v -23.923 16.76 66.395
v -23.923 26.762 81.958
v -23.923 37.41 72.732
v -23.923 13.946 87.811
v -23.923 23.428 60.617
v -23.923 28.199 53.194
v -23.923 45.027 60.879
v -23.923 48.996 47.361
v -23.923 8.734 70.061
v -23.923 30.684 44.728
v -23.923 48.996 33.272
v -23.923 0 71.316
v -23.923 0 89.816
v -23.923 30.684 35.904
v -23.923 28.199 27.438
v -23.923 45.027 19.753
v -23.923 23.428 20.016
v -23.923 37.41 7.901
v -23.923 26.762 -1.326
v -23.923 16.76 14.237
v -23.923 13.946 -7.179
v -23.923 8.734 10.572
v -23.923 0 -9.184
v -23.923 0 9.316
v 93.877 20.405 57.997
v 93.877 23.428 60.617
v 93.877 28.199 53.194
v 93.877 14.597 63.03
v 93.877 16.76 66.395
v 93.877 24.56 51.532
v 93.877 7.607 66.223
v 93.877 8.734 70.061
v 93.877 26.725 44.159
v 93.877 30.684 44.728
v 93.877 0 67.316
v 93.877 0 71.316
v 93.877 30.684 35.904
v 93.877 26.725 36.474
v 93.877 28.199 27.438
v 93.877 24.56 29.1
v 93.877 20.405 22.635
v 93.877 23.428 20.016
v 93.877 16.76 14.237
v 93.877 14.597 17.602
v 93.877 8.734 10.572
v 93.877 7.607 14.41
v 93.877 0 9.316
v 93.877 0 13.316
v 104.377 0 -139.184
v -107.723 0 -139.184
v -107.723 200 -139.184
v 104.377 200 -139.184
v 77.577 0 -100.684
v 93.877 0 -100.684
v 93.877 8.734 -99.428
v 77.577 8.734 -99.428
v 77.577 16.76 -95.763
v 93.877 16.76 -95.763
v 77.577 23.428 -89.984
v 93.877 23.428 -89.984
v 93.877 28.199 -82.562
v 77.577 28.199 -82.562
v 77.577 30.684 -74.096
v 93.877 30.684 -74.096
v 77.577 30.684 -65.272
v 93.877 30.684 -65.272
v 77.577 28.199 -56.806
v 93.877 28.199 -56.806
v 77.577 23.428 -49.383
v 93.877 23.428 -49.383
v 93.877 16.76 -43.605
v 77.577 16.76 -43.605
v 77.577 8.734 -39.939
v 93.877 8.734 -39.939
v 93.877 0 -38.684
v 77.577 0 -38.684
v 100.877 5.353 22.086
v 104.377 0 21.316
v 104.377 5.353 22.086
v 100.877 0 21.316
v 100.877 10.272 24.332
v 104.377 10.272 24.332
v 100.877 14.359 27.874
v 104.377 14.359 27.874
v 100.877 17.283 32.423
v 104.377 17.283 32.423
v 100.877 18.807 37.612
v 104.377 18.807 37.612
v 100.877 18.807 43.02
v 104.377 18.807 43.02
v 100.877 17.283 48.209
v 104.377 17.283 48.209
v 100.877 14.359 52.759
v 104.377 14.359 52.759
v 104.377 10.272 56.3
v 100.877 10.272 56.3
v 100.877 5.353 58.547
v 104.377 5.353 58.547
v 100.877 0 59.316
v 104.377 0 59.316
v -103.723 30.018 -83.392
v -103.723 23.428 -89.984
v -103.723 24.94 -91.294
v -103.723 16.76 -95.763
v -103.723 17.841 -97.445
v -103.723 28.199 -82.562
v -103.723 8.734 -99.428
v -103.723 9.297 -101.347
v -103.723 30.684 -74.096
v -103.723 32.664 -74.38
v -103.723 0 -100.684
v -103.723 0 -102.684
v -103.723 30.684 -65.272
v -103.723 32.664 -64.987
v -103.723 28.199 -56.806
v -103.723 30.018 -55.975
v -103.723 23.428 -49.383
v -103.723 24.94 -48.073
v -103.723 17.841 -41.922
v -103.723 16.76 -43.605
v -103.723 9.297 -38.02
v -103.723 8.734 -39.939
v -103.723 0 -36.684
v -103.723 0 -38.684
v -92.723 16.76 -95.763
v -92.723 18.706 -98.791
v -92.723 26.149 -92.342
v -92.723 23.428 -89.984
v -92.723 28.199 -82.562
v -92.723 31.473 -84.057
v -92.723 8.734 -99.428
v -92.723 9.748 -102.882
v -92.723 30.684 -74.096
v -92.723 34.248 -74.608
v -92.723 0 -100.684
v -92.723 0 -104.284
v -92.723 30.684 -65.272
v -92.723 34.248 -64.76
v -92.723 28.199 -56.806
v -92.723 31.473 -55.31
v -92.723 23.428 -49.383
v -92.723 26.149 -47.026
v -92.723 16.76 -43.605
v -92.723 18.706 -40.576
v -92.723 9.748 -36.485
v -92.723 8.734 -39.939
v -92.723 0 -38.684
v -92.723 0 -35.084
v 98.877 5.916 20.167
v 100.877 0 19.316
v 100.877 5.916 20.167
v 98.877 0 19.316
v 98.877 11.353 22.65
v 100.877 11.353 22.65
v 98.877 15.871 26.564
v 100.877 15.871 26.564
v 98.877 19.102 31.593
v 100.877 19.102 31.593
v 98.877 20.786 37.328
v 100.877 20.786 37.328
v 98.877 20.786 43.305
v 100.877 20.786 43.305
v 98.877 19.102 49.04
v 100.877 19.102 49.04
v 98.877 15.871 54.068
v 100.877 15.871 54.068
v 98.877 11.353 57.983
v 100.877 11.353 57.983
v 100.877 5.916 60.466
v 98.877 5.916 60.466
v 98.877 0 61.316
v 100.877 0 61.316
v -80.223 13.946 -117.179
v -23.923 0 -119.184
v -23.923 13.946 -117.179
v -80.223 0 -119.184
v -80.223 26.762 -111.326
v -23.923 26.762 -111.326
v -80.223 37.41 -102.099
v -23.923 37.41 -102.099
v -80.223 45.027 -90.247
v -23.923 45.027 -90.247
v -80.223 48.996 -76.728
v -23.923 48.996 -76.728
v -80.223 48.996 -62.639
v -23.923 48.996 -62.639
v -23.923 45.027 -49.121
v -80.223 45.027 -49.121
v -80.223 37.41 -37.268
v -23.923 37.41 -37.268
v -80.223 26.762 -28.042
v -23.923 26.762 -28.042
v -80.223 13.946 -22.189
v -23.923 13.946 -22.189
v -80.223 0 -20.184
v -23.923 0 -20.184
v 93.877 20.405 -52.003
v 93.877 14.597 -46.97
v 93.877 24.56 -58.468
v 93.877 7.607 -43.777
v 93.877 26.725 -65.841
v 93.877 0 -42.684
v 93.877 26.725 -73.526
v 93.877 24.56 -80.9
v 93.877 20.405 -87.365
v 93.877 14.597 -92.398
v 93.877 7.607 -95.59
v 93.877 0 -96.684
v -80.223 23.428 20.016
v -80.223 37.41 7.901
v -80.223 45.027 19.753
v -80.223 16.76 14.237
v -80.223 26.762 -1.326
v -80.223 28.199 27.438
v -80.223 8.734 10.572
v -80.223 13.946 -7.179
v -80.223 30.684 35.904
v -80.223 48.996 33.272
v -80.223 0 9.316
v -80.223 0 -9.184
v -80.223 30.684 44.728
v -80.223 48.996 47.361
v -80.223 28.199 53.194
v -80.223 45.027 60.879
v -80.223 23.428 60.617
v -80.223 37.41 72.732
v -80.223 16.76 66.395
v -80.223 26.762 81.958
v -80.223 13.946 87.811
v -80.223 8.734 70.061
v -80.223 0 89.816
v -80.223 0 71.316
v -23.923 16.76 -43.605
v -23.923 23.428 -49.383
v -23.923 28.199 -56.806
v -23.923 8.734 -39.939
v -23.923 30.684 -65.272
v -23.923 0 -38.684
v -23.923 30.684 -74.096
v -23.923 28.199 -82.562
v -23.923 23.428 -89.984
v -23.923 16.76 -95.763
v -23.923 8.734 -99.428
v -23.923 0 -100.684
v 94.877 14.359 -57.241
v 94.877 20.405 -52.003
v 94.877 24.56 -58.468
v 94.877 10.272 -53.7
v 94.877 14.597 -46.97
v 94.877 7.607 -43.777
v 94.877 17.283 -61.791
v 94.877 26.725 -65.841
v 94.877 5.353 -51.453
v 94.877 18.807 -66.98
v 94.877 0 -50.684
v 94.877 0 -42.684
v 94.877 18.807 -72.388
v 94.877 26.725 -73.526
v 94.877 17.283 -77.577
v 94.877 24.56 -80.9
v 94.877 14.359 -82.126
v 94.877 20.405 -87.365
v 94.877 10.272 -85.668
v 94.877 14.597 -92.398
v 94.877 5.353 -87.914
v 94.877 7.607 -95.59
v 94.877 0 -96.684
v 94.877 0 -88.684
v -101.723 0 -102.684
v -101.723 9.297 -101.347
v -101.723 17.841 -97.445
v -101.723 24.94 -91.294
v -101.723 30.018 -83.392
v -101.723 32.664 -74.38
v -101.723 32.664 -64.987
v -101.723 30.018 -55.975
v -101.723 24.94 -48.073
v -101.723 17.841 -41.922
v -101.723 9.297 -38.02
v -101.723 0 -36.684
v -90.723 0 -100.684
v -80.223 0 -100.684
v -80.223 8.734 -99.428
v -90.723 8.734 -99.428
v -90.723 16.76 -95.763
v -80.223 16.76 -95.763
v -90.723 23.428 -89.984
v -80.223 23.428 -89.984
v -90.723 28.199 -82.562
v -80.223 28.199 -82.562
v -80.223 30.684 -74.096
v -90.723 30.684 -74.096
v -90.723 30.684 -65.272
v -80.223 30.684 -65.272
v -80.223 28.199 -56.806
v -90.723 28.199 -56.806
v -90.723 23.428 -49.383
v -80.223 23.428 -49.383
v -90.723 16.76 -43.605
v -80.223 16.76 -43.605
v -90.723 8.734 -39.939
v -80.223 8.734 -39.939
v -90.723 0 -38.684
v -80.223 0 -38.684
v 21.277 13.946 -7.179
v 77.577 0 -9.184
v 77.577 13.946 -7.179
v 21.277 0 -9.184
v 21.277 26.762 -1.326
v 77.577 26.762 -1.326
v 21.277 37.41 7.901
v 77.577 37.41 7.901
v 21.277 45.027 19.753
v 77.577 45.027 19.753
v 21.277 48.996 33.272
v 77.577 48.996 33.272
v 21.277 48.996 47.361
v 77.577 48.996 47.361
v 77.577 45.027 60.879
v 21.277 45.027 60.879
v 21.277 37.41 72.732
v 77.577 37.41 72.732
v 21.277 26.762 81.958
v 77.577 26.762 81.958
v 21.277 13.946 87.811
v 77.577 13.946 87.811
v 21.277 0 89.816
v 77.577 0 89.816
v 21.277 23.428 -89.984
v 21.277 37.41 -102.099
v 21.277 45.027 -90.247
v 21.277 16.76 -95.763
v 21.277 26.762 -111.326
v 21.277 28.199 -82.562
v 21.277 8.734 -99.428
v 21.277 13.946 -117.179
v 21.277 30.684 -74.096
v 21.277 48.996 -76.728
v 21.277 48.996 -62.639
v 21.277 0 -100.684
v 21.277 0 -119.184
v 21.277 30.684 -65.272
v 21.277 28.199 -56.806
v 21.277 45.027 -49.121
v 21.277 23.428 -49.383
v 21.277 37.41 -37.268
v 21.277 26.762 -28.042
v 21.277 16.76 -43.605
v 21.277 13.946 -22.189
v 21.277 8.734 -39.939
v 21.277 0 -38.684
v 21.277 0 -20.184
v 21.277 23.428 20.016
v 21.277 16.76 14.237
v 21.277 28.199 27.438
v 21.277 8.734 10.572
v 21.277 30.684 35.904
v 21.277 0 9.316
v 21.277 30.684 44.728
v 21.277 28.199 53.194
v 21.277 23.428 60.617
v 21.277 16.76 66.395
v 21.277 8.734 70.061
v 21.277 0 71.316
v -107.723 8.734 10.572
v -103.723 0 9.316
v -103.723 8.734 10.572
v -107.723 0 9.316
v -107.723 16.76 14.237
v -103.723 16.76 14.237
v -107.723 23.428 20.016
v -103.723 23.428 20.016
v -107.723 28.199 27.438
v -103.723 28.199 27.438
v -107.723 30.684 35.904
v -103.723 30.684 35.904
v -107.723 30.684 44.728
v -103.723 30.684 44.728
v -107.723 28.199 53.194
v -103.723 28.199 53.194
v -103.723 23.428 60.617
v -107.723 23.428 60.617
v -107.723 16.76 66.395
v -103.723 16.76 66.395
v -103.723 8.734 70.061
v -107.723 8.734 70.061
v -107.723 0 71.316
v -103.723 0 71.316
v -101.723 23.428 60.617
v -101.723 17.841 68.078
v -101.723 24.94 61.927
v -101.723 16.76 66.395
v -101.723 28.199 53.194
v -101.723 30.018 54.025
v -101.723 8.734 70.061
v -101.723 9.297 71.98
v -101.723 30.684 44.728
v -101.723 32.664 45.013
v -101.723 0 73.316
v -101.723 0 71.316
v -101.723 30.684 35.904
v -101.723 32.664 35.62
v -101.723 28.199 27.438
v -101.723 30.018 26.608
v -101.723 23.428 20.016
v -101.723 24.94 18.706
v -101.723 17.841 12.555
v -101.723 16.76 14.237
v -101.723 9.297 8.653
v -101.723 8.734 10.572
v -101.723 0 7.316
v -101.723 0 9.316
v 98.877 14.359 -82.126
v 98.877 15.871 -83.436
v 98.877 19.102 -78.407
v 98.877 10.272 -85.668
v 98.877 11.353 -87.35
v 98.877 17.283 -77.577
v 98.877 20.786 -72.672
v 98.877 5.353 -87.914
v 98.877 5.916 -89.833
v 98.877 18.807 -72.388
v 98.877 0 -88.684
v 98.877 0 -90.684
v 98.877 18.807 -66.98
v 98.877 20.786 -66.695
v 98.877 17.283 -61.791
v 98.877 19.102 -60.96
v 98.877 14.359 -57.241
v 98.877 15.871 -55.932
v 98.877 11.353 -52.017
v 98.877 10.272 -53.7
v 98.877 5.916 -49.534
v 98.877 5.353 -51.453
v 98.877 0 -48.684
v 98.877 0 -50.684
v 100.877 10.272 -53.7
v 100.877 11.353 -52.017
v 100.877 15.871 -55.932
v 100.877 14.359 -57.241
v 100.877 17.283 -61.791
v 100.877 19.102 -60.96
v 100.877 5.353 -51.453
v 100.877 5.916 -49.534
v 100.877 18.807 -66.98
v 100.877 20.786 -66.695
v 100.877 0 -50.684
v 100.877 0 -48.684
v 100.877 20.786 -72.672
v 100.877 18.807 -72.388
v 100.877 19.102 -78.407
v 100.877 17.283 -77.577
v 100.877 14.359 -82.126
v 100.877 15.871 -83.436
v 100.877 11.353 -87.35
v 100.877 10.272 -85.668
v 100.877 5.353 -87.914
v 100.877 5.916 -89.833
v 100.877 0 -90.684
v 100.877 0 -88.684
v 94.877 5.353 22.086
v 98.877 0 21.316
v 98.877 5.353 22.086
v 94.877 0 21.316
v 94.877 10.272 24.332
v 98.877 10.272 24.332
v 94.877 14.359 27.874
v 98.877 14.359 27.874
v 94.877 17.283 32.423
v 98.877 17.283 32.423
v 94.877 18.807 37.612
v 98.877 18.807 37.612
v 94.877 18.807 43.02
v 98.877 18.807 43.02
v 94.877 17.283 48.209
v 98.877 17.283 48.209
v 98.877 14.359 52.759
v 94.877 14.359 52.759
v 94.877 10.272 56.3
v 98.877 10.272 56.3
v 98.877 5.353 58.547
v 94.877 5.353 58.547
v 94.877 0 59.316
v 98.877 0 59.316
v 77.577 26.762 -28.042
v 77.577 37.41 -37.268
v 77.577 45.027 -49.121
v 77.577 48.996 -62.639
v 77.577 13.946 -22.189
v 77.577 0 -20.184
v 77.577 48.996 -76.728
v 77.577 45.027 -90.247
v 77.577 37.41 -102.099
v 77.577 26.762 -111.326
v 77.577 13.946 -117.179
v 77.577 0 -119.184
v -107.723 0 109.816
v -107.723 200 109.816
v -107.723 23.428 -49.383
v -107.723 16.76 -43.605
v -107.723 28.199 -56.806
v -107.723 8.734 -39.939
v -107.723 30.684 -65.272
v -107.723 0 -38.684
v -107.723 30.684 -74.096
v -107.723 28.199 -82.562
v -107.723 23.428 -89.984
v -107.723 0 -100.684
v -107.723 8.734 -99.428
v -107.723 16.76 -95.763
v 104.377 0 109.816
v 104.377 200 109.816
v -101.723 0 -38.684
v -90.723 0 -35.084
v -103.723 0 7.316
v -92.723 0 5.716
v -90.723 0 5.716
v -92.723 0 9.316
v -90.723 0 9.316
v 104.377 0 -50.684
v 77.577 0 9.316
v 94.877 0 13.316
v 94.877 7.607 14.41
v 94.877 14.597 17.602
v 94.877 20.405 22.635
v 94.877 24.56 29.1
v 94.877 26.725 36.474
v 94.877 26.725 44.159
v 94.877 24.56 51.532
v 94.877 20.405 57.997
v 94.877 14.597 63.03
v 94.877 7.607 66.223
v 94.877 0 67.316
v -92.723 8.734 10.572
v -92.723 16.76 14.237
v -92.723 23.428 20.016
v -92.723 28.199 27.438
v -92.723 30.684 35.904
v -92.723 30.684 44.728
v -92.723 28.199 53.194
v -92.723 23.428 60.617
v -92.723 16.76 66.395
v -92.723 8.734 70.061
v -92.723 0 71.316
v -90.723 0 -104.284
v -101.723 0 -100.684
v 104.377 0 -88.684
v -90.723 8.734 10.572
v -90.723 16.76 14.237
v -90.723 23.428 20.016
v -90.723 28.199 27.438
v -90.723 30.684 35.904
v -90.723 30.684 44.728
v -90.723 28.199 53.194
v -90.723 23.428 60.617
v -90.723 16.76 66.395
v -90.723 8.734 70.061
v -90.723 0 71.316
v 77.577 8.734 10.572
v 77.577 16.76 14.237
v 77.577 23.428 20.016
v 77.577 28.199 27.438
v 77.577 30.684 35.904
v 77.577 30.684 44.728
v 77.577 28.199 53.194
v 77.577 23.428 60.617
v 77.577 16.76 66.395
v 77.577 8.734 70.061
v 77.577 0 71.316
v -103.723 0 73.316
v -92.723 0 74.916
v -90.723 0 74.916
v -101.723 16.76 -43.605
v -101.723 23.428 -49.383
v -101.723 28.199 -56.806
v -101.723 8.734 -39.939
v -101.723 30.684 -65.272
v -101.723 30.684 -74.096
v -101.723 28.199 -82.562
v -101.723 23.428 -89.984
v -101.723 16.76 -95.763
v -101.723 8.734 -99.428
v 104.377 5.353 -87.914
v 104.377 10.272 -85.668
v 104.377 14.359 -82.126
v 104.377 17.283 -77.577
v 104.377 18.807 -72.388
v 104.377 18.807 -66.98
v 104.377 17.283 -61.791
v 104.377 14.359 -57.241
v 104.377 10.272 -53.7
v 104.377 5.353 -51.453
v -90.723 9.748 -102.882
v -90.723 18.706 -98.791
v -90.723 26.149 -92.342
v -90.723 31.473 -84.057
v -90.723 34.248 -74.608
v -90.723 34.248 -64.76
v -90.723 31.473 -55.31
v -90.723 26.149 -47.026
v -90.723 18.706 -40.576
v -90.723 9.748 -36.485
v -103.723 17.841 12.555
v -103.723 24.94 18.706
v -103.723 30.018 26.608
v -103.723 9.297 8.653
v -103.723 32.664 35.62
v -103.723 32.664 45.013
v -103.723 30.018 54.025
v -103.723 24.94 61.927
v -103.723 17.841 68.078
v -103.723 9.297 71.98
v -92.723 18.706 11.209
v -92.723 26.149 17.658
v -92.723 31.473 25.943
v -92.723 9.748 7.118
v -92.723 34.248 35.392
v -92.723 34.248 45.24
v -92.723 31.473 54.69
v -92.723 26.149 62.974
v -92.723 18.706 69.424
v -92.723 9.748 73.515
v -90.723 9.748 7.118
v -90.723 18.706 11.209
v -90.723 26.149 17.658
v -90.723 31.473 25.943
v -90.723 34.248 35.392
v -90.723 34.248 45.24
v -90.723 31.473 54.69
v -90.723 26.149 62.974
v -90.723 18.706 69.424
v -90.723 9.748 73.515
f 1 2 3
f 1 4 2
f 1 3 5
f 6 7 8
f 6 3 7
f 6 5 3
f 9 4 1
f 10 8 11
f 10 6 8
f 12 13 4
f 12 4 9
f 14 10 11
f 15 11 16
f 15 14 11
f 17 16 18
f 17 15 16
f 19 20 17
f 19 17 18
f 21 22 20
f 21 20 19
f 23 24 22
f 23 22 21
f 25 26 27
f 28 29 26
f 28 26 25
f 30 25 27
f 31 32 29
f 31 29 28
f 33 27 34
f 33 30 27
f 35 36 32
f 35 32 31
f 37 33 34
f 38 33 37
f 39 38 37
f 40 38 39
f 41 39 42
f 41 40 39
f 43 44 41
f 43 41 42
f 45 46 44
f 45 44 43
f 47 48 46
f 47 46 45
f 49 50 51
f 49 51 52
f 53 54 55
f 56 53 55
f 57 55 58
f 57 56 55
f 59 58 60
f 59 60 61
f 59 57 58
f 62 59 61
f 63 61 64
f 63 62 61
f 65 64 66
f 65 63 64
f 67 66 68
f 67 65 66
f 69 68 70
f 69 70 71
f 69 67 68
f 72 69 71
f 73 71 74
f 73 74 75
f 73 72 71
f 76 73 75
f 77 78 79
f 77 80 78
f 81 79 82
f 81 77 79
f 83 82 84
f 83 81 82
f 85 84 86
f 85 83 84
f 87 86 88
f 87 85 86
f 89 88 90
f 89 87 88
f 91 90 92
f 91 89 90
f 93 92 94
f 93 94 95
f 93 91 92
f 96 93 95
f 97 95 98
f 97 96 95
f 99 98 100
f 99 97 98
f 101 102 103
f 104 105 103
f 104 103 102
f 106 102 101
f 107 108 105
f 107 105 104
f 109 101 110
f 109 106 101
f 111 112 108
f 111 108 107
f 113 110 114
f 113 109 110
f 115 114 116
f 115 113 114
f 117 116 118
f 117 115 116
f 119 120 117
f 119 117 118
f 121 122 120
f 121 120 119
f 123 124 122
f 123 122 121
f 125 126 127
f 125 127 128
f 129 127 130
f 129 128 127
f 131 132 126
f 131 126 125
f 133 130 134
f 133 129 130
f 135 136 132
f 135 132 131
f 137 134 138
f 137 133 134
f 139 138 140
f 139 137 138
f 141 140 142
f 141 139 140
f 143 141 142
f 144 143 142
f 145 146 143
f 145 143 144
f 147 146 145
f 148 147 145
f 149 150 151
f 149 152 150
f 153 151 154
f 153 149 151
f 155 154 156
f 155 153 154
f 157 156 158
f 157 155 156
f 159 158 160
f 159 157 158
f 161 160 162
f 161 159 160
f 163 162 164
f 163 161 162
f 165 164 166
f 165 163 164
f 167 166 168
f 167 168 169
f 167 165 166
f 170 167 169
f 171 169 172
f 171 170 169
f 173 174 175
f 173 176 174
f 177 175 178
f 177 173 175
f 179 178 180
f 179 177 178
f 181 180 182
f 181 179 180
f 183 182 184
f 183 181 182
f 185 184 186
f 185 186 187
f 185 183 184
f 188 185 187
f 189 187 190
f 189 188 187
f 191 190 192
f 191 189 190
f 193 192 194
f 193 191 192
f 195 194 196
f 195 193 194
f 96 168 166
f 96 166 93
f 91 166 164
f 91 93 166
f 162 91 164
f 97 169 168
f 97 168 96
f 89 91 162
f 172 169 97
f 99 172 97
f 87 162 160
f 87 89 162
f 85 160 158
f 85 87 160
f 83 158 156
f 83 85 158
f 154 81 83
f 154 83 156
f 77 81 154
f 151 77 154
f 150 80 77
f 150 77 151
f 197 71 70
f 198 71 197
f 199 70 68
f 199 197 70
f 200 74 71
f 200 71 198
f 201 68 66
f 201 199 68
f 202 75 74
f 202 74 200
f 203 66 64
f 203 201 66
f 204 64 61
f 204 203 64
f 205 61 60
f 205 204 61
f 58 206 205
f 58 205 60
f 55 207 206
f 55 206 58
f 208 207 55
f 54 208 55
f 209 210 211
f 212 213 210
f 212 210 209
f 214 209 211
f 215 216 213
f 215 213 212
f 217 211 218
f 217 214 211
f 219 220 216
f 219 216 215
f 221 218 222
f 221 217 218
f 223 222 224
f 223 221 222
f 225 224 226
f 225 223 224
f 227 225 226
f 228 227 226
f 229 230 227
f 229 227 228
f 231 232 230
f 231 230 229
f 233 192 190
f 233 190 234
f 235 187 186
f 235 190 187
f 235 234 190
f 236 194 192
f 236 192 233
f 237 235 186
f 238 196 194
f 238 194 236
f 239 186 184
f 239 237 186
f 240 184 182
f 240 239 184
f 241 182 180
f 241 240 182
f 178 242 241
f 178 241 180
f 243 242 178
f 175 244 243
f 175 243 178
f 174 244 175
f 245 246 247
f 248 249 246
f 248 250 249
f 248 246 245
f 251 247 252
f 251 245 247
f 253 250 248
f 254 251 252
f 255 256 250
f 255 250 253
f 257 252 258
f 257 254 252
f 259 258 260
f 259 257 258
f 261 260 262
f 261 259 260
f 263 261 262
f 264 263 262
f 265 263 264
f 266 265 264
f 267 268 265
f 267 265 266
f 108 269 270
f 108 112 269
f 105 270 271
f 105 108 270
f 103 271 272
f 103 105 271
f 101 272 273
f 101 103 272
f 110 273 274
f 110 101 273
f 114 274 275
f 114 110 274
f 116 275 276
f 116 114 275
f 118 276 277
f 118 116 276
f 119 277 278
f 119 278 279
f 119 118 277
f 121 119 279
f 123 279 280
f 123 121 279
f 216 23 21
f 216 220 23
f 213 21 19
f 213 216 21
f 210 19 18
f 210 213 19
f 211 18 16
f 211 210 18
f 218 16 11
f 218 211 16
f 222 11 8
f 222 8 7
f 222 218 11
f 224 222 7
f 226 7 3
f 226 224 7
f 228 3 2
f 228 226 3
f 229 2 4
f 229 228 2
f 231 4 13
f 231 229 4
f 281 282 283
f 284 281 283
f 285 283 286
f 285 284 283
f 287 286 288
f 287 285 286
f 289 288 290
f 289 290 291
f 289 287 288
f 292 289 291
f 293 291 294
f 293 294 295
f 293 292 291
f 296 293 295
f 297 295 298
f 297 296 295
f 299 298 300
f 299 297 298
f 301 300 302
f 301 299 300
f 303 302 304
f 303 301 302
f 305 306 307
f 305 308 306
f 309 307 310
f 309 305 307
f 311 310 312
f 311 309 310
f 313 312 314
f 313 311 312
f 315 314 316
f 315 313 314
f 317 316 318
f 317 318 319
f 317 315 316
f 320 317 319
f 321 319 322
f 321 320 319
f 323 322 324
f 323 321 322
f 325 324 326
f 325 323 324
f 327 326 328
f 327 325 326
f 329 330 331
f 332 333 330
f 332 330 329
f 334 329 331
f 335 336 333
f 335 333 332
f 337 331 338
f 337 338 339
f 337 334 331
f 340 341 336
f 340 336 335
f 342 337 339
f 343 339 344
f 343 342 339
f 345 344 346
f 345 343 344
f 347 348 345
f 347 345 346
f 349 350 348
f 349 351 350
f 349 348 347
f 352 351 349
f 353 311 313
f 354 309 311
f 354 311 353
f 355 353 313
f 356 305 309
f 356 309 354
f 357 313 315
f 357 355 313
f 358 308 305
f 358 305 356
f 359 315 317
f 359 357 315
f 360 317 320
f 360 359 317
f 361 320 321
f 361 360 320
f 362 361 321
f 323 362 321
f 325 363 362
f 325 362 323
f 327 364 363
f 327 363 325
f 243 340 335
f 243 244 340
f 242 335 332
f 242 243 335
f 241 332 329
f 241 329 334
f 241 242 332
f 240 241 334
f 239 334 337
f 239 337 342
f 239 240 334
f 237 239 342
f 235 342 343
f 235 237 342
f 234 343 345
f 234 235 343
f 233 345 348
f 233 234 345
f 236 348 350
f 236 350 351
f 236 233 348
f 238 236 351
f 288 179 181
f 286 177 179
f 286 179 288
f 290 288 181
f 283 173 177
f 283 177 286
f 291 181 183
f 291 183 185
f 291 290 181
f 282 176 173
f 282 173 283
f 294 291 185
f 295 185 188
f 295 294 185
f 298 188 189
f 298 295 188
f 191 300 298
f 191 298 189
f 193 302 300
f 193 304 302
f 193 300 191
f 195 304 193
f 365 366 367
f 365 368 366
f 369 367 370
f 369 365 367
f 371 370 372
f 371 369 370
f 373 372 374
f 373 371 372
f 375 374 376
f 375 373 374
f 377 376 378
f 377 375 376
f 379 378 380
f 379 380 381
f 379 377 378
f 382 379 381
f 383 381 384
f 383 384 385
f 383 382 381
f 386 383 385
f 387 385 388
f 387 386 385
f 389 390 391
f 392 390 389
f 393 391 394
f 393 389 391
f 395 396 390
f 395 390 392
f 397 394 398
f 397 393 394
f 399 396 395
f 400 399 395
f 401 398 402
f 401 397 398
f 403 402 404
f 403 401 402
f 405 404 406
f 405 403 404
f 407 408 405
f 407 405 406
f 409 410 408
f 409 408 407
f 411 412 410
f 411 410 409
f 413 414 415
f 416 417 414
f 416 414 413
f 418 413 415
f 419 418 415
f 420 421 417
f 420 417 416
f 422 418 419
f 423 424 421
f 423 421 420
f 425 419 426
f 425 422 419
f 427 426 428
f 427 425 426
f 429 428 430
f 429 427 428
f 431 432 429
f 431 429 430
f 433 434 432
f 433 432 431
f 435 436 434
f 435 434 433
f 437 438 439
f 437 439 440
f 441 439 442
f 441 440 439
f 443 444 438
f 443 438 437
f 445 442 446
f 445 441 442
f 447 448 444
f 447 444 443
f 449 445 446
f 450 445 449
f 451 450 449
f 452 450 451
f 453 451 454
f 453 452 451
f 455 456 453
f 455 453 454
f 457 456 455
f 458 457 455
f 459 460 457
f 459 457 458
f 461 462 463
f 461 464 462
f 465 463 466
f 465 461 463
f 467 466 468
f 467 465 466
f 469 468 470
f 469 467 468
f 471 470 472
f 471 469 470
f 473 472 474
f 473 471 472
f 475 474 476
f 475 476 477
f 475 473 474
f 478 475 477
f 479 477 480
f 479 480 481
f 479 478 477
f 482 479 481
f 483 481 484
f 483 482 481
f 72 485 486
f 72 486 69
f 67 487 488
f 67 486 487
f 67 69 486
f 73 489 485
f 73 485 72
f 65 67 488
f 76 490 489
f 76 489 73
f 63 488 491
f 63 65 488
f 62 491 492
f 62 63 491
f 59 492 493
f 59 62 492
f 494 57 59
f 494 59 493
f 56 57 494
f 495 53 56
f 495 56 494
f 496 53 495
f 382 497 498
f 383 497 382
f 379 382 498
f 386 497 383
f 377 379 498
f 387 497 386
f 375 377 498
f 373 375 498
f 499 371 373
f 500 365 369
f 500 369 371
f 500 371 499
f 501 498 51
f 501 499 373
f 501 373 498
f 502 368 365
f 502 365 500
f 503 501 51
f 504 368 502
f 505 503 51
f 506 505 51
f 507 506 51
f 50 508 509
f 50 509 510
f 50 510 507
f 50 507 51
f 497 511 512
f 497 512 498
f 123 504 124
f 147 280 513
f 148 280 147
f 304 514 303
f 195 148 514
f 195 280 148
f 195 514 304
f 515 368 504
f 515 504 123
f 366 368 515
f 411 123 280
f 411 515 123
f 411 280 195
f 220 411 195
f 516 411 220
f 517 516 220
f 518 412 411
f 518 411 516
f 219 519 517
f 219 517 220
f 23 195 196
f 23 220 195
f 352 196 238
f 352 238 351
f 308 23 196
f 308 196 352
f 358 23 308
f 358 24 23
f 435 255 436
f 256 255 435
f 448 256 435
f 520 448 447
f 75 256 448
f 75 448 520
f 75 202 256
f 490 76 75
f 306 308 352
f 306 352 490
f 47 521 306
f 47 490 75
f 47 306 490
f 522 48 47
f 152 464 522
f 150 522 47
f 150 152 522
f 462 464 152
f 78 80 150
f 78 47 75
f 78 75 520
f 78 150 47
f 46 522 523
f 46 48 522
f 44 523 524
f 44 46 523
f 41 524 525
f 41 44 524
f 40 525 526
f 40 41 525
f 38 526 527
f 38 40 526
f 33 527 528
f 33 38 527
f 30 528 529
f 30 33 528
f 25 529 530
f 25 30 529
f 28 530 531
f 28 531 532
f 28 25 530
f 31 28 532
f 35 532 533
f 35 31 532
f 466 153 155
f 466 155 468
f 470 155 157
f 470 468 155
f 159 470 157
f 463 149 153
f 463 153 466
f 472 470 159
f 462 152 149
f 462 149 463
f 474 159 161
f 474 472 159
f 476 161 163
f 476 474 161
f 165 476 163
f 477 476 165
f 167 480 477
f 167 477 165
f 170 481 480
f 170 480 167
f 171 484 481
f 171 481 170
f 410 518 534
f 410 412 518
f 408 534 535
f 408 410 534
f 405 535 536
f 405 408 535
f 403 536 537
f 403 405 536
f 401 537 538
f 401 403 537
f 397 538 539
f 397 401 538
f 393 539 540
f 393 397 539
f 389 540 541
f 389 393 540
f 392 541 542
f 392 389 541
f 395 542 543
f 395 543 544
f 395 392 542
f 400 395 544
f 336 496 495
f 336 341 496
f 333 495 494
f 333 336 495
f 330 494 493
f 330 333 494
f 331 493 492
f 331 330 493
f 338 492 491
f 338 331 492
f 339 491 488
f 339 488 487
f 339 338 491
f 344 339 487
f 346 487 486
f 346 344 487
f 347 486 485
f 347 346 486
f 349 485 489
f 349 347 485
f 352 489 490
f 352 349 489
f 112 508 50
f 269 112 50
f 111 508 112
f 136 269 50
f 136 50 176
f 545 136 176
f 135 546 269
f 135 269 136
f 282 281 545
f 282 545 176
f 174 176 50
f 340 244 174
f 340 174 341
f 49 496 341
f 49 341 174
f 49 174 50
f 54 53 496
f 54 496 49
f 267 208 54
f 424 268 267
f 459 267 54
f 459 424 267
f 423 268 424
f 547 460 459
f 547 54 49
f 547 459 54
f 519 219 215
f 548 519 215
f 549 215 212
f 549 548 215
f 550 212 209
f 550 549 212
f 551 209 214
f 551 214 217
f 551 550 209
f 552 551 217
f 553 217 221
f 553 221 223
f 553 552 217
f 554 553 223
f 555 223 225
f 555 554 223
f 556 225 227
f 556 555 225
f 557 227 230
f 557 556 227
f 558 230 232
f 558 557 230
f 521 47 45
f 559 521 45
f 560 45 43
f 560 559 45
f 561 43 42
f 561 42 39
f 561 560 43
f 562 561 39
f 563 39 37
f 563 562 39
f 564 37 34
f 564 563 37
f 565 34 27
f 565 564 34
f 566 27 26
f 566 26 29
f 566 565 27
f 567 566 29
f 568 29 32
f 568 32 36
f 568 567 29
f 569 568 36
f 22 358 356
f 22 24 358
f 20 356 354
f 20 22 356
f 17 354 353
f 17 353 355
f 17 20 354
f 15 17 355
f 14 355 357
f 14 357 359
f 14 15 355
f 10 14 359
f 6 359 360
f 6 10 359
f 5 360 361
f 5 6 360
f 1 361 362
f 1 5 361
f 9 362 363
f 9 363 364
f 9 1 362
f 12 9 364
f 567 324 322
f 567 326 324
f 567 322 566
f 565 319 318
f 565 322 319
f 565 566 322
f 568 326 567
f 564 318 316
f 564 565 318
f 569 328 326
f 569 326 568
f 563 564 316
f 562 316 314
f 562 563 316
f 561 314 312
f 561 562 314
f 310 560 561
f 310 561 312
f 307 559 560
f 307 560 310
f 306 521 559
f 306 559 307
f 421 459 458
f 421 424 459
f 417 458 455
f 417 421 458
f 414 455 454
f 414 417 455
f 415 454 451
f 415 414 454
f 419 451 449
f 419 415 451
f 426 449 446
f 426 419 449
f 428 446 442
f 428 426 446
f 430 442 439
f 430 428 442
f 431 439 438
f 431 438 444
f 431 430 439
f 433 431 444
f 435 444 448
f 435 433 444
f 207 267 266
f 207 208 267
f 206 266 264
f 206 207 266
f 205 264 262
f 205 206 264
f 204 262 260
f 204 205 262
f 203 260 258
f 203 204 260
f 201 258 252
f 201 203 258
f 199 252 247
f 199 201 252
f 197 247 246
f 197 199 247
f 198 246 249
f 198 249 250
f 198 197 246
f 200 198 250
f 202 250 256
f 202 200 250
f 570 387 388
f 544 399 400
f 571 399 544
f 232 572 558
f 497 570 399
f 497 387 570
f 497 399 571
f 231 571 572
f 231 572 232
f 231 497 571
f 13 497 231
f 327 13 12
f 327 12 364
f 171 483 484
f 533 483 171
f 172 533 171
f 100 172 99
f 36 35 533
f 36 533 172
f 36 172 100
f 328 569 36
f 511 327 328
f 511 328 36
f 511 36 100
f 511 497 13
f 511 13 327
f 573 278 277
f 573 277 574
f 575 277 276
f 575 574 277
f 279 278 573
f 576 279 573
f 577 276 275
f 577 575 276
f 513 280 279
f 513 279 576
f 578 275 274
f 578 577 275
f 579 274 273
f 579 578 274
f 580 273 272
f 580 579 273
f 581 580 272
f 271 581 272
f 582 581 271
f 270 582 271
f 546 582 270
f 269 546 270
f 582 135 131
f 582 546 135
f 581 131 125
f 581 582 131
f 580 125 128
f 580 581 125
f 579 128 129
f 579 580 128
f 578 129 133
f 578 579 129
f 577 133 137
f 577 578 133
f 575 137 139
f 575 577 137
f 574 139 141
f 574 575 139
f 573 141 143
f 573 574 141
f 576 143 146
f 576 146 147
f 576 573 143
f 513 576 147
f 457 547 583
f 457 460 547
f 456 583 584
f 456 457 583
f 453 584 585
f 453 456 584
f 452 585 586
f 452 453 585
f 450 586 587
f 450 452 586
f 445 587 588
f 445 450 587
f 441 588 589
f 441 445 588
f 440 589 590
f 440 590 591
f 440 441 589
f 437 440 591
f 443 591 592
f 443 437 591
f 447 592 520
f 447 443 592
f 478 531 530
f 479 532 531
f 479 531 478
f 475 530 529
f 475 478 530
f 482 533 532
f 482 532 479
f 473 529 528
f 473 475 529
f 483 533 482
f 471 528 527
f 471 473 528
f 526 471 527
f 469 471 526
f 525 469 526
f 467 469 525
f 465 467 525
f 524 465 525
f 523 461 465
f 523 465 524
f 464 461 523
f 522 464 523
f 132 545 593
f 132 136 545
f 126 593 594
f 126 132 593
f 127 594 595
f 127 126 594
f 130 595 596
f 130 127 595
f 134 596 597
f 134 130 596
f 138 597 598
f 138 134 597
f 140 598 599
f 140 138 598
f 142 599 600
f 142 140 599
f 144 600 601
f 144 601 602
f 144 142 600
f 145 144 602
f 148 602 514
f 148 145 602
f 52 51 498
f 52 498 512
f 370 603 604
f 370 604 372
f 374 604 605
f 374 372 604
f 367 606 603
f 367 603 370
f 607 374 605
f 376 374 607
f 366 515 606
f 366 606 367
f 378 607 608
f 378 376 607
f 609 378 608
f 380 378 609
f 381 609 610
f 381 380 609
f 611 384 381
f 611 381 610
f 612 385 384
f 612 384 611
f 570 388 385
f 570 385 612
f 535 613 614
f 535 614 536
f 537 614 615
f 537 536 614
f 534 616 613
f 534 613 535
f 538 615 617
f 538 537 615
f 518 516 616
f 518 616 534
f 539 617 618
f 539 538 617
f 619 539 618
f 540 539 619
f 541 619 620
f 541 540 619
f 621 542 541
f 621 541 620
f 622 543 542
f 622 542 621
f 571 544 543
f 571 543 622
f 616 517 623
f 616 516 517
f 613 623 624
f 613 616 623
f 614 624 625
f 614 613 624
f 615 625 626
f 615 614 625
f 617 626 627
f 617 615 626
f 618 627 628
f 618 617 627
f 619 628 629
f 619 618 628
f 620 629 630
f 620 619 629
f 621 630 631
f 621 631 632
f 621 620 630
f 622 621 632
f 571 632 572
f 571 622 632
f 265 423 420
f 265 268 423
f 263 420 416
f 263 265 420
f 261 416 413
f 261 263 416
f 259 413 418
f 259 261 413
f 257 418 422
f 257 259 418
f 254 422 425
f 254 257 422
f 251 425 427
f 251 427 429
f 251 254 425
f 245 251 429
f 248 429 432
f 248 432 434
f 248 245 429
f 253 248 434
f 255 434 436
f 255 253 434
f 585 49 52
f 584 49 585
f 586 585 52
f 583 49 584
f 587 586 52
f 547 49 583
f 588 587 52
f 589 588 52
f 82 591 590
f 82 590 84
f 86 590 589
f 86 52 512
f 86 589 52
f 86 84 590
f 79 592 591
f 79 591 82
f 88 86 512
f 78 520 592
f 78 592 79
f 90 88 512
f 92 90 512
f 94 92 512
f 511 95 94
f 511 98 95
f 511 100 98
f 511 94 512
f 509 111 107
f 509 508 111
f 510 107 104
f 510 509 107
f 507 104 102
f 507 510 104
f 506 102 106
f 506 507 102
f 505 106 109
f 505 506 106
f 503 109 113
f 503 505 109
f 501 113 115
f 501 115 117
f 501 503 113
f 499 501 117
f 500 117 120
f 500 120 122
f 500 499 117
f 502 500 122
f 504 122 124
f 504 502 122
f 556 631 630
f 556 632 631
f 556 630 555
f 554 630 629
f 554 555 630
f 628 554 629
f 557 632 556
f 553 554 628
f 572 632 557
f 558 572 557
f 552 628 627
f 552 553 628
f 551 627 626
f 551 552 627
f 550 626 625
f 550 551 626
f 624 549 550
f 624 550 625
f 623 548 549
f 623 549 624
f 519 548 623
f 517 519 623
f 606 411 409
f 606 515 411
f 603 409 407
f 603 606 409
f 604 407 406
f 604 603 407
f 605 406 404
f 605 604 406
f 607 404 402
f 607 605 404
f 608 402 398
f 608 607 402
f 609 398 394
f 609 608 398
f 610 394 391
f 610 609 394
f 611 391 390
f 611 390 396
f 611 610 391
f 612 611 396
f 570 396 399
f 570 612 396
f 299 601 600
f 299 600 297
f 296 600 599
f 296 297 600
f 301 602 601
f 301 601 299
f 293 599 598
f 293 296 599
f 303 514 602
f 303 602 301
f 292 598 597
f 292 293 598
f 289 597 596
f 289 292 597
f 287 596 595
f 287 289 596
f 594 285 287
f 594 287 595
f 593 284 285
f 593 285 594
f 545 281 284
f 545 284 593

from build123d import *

# Parameters (mm, degrees)
F1_DEPTH = 200


with BuildPart() as f1:
    # F0 (on Front) → F1 (new body)
    with BuildSketch(Plane.XZ):
        Polygon((-107.723215, 71.316256), (-107.723215, 40.316256), (104.376785, 40.316256), (104.376785, 59.316256), (100.876785, 59.316256), (100.876785, 61.316256), (98.876785, 61.316256), (98.876785, 59.316256), (94.876785, 59.316256), (94.876785, 67.316256), (93.876785, 67.316256), (93.876785, 71.316256), (77.576785, 71.316256), (77.576785, 89.816256), (21.276785, 89.816256), (21.276785, 71.316256), (-23.923215, 71.316256), (-23.923215, 89.816256), (-80.223215, 89.816256), (-80.223215, 71.316256), (-90.723215, 71.316256), (-90.723215, 74.916256), (-92.723215, 74.916256), (-92.723215, 71.316256), (-101.723215, 71.316256), (-101.723215, 73.316256), (-103.723215, 73.316256), (-103.723215, 71.316256), align=None)
        Polygon((-107.723215, 109.816256), (-107.723215, 71.316256), (-103.723215, 71.316256), (-103.723215, 73.316256), (-101.723215, 73.316256), (-101.723215, 71.316256), (-92.723215, 71.316256), (-92.723215, 74.916256), (-90.723215, 74.916256), (-90.723215, 71.316256), (-80.223215, 71.316256), (-80.223215, 89.816256), (-23.923215, 89.816256), (-23.923215, 71.316256), (21.276785, 71.316256), (21.276785, 89.816256), (77.576785, 89.816256), (77.576785, 71.316256), (93.876785, 71.316256), (93.876785, 67.316256), (94.876785, 67.316256), (94.876785, 59.316256), (98.876785, 59.316256), (98.876785, 61.316256), (100.876785, 61.316256), (100.876785, 59.316256), (104.376785, 59.316256), (104.376785, 109.816256), align=None)
        Polygon((-107.723215, 40.316256), (-107.723215, 9.316256), (-103.723215, 9.316256), (-103.723215, 7.316256), (-101.723215, 7.316256), (-101.723215, 9.316256), (-92.723215, 9.316256), (-92.723215, 5.716256), (-90.723215, 5.716256), (-90.723215, 9.316256), (-80.223215, 9.316256), (-80.223215, -9.183744), (-23.923215, -9.183744), (-23.923215, 9.316256), (21.276785, 9.316256), (21.276785, -9.183744), (77.576785, -9.183744), (77.576785, 9.316256), (93.876785, 9.316256), (93.876785, 13.316256), (94.876785, 13.316256), (94.876785, 21.316256), (98.876785, 21.316256), (98.876785, 19.316256), (100.876785, 19.316256), (100.876785, 21.316256), (104.376785, 21.316256), (104.376785, 40.316256), align=None)
        Polygon((-107.723215, 9.316256), (-107.723215, -38.683744), (-103.723215, -38.683744), (-103.723215, -36.683744), (-101.723215, -36.683744), (-101.723215, -38.683744), (-92.723215, -38.683744), (-92.723215, -35.083744), (-90.723215, -35.083744), (-90.723215, -38.683744), (-80.223215, -38.683744), (-80.223215, -20.183744), (-23.923215, -20.183744), (-23.923215, -38.683744), (21.276785, -38.683744), (21.276785, -20.183744), (77.576785, -20.183744), (77.576785, -38.683744), (93.876785, -38.683744), (93.876785, -42.683744), (94.876785, -42.683744), (94.876785, -50.683744), (98.876785, -50.683744), (98.876785, -48.683744), (100.876785, -48.683744), (100.876785, -50.683744), (104.376785, -50.683744), (104.376785, 21.316256), (100.876785, 21.316256), (100.876785, 19.316256), (98.876785, 19.316256), (98.876785, 21.316256), (94.876785, 21.316256), (94.876785, 13.316256), (93.876785, 13.316256), (93.876785, 9.316256), (77.576785, 9.316256), (77.576785, -9.183744), (21.276785, -9.183744), (21.276785, 9.316256), (-23.923215, 9.316256), (-23.923215, -9.183744), (-80.223215, -9.183744), (-80.223215, 9.316256), (-90.723215, 9.316256), (-90.723215, 5.716256), (-92.723215, 5.716256), (-92.723215, 9.316256), (-101.723215, 9.316256), (-101.723215, 7.316256), (-103.723215, 7.316256), (-103.723215, 9.316256), align=None)
        Polygon((-103.723215, -38.683744), (-107.723215, -38.683744), (-107.723215, -69.683744), (104.376785, -69.683744), (104.376785, -50.683744), (100.876785, -50.683744), (100.876785, -48.683744), (98.876785, -48.683744), (98.876785, -50.683744), (94.876785, -50.683744), (94.876785, -42.683744), (93.876785, -42.683744), (93.876785, -38.683744), (77.576785, -38.683744), (77.576785, -20.183744), (21.276785, -20.183744), (21.276785, -38.683744), (-23.923215, -38.683744), (-23.923215, -20.183744), (-80.223215, -20.183744), (-80.223215, -38.683744), (-90.723215, -38.683744), (-90.723215, -35.083744), (-92.723215, -35.083744), (-92.723215, -38.683744), (-101.723215, -38.683744), (-101.723215, -36.683744), (-103.723215, -36.683744), align=None)
        Polygon((104.376785, -69.683744), (-107.723215, -69.683744), (-107.723215, -100.683744), (-103.723215, -100.683744), (-103.723215, -102.683744), (-101.723215, -102.683744), (-101.723215, -100.683744), (-92.723215, -100.683744), (-92.723215, -104.283744), (-90.723215, -104.283744), (-90.723215, -100.683744), (-80.223215, -100.683744), (-80.223215, -119.183744), (-23.923215, -119.183744), (-23.923215, -100.683744), (21.276785, -100.683744), (21.276785, -119.183744), (77.576785, -119.183744), (77.576785, -100.683744), (93.876785, -100.683744), (93.876785, -96.683744), (94.876785, -96.683744), (94.876785, -88.683744), (98.876785, -88.683744), (98.876785, -90.683744), (100.876785, -90.683744), (100.876785, -88.683744), (104.376785, -88.683744), align=None)
        Polygon((-103.723215, -100.683744), (-107.723215, -100.683744), (-107.723215, -139.183744), (104.376785, -139.183744), (104.376785, -88.683744), (100.876785, -88.683744), (100.876785, -90.683744), (98.876785, -90.683744), (98.876785, -88.683744), (94.876785, -88.683744), (94.876785, -96.683744), (93.876785, -96.683744), (93.876785, -100.683744), (77.576785, -100.683744), (77.576785, -119.183744), (21.276785, -119.183744), (21.276785, -100.683744), (-23.923215, -100.683744), (-23.923215, -119.183744), (-80.223215, -119.183744), (-80.223215, -100.683744), (-90.723215, -100.683744), (-90.723215, -104.283744), (-92.723215, -104.283744), (-92.723215, -100.683744), (-101.723215, -100.683744), (-101.723215, -102.683744), (-103.723215, -102.683744), align=None)
    extrude(amount=-F1_DEPTH)

    # F0 (on Front) → F2 (revolve, cut)
    with BuildSketch(Plane.XZ):
        Polygon((-107.723215, 71.316256), (-107.723215, 40.316256), (104.376785, 40.316256), (104.376785, 59.316256), (100.876785, 59.316256), (100.876785, 61.316256), (98.876785, 61.316256), (98.876785, 59.316256), (94.876785, 59.316256), (94.876785, 67.316256), (93.876785, 67.316256), (93.876785, 71.316256), (77.576785, 71.316256), (77.576785, 89.816256), (21.276785, 89.816256), (21.276785, 71.316256), (-23.923215, 71.316256), (-23.923215, 89.816256), (-80.223215, 89.816256), (-80.223215, 71.316256), (-90.723215, 71.316256), (-90.723215, 74.916256), (-92.723215, 74.916256), (-92.723215, 71.316256), (-101.723215, 71.316256), (-101.723215, 73.316256), (-103.723215, 73.316256), (-103.723215, 71.316256), align=None)
    revolve(axis=Axis((-1.673215, 0, 40.316256), (1, 0, 0)), mode=Mode.SUBTRACT)

    # F0 (on Front) → F3 (revolve, cut)
    with BuildSketch(Plane.XZ):
        Polygon((-103.723215, -38.683744), (-107.723215, -38.683744), (-107.723215, -69.683744), (104.376785, -69.683744), (104.376785, -50.683744), (100.876785, -50.683744), (100.876785, -48.683744), (98.876785, -48.683744), (98.876785, -50.683744), (94.876785, -50.683744), (94.876785, -42.683744), (93.876785, -42.683744), (93.876785, -38.683744), (77.576785, -38.683744), (77.576785, -20.183744), (21.276785, -20.183744), (21.276785, -38.683744), (-23.923215, -38.683744), (-23.923215, -20.183744), (-80.223215, -20.183744), (-80.223215, -38.683744), (-90.723215, -38.683744), (-90.723215, -35.083744), (-92.723215, -35.083744), (-92.723215, -38.683744), (-101.723215, -38.683744), (-101.723215, -36.683744), (-103.723215, -36.683744), align=None)
    revolve(axis=Axis((-1.673215, 0, -69.683744), (1, 0, 0)), mode=Mode.SUBTRACT)


solid = f1.part
